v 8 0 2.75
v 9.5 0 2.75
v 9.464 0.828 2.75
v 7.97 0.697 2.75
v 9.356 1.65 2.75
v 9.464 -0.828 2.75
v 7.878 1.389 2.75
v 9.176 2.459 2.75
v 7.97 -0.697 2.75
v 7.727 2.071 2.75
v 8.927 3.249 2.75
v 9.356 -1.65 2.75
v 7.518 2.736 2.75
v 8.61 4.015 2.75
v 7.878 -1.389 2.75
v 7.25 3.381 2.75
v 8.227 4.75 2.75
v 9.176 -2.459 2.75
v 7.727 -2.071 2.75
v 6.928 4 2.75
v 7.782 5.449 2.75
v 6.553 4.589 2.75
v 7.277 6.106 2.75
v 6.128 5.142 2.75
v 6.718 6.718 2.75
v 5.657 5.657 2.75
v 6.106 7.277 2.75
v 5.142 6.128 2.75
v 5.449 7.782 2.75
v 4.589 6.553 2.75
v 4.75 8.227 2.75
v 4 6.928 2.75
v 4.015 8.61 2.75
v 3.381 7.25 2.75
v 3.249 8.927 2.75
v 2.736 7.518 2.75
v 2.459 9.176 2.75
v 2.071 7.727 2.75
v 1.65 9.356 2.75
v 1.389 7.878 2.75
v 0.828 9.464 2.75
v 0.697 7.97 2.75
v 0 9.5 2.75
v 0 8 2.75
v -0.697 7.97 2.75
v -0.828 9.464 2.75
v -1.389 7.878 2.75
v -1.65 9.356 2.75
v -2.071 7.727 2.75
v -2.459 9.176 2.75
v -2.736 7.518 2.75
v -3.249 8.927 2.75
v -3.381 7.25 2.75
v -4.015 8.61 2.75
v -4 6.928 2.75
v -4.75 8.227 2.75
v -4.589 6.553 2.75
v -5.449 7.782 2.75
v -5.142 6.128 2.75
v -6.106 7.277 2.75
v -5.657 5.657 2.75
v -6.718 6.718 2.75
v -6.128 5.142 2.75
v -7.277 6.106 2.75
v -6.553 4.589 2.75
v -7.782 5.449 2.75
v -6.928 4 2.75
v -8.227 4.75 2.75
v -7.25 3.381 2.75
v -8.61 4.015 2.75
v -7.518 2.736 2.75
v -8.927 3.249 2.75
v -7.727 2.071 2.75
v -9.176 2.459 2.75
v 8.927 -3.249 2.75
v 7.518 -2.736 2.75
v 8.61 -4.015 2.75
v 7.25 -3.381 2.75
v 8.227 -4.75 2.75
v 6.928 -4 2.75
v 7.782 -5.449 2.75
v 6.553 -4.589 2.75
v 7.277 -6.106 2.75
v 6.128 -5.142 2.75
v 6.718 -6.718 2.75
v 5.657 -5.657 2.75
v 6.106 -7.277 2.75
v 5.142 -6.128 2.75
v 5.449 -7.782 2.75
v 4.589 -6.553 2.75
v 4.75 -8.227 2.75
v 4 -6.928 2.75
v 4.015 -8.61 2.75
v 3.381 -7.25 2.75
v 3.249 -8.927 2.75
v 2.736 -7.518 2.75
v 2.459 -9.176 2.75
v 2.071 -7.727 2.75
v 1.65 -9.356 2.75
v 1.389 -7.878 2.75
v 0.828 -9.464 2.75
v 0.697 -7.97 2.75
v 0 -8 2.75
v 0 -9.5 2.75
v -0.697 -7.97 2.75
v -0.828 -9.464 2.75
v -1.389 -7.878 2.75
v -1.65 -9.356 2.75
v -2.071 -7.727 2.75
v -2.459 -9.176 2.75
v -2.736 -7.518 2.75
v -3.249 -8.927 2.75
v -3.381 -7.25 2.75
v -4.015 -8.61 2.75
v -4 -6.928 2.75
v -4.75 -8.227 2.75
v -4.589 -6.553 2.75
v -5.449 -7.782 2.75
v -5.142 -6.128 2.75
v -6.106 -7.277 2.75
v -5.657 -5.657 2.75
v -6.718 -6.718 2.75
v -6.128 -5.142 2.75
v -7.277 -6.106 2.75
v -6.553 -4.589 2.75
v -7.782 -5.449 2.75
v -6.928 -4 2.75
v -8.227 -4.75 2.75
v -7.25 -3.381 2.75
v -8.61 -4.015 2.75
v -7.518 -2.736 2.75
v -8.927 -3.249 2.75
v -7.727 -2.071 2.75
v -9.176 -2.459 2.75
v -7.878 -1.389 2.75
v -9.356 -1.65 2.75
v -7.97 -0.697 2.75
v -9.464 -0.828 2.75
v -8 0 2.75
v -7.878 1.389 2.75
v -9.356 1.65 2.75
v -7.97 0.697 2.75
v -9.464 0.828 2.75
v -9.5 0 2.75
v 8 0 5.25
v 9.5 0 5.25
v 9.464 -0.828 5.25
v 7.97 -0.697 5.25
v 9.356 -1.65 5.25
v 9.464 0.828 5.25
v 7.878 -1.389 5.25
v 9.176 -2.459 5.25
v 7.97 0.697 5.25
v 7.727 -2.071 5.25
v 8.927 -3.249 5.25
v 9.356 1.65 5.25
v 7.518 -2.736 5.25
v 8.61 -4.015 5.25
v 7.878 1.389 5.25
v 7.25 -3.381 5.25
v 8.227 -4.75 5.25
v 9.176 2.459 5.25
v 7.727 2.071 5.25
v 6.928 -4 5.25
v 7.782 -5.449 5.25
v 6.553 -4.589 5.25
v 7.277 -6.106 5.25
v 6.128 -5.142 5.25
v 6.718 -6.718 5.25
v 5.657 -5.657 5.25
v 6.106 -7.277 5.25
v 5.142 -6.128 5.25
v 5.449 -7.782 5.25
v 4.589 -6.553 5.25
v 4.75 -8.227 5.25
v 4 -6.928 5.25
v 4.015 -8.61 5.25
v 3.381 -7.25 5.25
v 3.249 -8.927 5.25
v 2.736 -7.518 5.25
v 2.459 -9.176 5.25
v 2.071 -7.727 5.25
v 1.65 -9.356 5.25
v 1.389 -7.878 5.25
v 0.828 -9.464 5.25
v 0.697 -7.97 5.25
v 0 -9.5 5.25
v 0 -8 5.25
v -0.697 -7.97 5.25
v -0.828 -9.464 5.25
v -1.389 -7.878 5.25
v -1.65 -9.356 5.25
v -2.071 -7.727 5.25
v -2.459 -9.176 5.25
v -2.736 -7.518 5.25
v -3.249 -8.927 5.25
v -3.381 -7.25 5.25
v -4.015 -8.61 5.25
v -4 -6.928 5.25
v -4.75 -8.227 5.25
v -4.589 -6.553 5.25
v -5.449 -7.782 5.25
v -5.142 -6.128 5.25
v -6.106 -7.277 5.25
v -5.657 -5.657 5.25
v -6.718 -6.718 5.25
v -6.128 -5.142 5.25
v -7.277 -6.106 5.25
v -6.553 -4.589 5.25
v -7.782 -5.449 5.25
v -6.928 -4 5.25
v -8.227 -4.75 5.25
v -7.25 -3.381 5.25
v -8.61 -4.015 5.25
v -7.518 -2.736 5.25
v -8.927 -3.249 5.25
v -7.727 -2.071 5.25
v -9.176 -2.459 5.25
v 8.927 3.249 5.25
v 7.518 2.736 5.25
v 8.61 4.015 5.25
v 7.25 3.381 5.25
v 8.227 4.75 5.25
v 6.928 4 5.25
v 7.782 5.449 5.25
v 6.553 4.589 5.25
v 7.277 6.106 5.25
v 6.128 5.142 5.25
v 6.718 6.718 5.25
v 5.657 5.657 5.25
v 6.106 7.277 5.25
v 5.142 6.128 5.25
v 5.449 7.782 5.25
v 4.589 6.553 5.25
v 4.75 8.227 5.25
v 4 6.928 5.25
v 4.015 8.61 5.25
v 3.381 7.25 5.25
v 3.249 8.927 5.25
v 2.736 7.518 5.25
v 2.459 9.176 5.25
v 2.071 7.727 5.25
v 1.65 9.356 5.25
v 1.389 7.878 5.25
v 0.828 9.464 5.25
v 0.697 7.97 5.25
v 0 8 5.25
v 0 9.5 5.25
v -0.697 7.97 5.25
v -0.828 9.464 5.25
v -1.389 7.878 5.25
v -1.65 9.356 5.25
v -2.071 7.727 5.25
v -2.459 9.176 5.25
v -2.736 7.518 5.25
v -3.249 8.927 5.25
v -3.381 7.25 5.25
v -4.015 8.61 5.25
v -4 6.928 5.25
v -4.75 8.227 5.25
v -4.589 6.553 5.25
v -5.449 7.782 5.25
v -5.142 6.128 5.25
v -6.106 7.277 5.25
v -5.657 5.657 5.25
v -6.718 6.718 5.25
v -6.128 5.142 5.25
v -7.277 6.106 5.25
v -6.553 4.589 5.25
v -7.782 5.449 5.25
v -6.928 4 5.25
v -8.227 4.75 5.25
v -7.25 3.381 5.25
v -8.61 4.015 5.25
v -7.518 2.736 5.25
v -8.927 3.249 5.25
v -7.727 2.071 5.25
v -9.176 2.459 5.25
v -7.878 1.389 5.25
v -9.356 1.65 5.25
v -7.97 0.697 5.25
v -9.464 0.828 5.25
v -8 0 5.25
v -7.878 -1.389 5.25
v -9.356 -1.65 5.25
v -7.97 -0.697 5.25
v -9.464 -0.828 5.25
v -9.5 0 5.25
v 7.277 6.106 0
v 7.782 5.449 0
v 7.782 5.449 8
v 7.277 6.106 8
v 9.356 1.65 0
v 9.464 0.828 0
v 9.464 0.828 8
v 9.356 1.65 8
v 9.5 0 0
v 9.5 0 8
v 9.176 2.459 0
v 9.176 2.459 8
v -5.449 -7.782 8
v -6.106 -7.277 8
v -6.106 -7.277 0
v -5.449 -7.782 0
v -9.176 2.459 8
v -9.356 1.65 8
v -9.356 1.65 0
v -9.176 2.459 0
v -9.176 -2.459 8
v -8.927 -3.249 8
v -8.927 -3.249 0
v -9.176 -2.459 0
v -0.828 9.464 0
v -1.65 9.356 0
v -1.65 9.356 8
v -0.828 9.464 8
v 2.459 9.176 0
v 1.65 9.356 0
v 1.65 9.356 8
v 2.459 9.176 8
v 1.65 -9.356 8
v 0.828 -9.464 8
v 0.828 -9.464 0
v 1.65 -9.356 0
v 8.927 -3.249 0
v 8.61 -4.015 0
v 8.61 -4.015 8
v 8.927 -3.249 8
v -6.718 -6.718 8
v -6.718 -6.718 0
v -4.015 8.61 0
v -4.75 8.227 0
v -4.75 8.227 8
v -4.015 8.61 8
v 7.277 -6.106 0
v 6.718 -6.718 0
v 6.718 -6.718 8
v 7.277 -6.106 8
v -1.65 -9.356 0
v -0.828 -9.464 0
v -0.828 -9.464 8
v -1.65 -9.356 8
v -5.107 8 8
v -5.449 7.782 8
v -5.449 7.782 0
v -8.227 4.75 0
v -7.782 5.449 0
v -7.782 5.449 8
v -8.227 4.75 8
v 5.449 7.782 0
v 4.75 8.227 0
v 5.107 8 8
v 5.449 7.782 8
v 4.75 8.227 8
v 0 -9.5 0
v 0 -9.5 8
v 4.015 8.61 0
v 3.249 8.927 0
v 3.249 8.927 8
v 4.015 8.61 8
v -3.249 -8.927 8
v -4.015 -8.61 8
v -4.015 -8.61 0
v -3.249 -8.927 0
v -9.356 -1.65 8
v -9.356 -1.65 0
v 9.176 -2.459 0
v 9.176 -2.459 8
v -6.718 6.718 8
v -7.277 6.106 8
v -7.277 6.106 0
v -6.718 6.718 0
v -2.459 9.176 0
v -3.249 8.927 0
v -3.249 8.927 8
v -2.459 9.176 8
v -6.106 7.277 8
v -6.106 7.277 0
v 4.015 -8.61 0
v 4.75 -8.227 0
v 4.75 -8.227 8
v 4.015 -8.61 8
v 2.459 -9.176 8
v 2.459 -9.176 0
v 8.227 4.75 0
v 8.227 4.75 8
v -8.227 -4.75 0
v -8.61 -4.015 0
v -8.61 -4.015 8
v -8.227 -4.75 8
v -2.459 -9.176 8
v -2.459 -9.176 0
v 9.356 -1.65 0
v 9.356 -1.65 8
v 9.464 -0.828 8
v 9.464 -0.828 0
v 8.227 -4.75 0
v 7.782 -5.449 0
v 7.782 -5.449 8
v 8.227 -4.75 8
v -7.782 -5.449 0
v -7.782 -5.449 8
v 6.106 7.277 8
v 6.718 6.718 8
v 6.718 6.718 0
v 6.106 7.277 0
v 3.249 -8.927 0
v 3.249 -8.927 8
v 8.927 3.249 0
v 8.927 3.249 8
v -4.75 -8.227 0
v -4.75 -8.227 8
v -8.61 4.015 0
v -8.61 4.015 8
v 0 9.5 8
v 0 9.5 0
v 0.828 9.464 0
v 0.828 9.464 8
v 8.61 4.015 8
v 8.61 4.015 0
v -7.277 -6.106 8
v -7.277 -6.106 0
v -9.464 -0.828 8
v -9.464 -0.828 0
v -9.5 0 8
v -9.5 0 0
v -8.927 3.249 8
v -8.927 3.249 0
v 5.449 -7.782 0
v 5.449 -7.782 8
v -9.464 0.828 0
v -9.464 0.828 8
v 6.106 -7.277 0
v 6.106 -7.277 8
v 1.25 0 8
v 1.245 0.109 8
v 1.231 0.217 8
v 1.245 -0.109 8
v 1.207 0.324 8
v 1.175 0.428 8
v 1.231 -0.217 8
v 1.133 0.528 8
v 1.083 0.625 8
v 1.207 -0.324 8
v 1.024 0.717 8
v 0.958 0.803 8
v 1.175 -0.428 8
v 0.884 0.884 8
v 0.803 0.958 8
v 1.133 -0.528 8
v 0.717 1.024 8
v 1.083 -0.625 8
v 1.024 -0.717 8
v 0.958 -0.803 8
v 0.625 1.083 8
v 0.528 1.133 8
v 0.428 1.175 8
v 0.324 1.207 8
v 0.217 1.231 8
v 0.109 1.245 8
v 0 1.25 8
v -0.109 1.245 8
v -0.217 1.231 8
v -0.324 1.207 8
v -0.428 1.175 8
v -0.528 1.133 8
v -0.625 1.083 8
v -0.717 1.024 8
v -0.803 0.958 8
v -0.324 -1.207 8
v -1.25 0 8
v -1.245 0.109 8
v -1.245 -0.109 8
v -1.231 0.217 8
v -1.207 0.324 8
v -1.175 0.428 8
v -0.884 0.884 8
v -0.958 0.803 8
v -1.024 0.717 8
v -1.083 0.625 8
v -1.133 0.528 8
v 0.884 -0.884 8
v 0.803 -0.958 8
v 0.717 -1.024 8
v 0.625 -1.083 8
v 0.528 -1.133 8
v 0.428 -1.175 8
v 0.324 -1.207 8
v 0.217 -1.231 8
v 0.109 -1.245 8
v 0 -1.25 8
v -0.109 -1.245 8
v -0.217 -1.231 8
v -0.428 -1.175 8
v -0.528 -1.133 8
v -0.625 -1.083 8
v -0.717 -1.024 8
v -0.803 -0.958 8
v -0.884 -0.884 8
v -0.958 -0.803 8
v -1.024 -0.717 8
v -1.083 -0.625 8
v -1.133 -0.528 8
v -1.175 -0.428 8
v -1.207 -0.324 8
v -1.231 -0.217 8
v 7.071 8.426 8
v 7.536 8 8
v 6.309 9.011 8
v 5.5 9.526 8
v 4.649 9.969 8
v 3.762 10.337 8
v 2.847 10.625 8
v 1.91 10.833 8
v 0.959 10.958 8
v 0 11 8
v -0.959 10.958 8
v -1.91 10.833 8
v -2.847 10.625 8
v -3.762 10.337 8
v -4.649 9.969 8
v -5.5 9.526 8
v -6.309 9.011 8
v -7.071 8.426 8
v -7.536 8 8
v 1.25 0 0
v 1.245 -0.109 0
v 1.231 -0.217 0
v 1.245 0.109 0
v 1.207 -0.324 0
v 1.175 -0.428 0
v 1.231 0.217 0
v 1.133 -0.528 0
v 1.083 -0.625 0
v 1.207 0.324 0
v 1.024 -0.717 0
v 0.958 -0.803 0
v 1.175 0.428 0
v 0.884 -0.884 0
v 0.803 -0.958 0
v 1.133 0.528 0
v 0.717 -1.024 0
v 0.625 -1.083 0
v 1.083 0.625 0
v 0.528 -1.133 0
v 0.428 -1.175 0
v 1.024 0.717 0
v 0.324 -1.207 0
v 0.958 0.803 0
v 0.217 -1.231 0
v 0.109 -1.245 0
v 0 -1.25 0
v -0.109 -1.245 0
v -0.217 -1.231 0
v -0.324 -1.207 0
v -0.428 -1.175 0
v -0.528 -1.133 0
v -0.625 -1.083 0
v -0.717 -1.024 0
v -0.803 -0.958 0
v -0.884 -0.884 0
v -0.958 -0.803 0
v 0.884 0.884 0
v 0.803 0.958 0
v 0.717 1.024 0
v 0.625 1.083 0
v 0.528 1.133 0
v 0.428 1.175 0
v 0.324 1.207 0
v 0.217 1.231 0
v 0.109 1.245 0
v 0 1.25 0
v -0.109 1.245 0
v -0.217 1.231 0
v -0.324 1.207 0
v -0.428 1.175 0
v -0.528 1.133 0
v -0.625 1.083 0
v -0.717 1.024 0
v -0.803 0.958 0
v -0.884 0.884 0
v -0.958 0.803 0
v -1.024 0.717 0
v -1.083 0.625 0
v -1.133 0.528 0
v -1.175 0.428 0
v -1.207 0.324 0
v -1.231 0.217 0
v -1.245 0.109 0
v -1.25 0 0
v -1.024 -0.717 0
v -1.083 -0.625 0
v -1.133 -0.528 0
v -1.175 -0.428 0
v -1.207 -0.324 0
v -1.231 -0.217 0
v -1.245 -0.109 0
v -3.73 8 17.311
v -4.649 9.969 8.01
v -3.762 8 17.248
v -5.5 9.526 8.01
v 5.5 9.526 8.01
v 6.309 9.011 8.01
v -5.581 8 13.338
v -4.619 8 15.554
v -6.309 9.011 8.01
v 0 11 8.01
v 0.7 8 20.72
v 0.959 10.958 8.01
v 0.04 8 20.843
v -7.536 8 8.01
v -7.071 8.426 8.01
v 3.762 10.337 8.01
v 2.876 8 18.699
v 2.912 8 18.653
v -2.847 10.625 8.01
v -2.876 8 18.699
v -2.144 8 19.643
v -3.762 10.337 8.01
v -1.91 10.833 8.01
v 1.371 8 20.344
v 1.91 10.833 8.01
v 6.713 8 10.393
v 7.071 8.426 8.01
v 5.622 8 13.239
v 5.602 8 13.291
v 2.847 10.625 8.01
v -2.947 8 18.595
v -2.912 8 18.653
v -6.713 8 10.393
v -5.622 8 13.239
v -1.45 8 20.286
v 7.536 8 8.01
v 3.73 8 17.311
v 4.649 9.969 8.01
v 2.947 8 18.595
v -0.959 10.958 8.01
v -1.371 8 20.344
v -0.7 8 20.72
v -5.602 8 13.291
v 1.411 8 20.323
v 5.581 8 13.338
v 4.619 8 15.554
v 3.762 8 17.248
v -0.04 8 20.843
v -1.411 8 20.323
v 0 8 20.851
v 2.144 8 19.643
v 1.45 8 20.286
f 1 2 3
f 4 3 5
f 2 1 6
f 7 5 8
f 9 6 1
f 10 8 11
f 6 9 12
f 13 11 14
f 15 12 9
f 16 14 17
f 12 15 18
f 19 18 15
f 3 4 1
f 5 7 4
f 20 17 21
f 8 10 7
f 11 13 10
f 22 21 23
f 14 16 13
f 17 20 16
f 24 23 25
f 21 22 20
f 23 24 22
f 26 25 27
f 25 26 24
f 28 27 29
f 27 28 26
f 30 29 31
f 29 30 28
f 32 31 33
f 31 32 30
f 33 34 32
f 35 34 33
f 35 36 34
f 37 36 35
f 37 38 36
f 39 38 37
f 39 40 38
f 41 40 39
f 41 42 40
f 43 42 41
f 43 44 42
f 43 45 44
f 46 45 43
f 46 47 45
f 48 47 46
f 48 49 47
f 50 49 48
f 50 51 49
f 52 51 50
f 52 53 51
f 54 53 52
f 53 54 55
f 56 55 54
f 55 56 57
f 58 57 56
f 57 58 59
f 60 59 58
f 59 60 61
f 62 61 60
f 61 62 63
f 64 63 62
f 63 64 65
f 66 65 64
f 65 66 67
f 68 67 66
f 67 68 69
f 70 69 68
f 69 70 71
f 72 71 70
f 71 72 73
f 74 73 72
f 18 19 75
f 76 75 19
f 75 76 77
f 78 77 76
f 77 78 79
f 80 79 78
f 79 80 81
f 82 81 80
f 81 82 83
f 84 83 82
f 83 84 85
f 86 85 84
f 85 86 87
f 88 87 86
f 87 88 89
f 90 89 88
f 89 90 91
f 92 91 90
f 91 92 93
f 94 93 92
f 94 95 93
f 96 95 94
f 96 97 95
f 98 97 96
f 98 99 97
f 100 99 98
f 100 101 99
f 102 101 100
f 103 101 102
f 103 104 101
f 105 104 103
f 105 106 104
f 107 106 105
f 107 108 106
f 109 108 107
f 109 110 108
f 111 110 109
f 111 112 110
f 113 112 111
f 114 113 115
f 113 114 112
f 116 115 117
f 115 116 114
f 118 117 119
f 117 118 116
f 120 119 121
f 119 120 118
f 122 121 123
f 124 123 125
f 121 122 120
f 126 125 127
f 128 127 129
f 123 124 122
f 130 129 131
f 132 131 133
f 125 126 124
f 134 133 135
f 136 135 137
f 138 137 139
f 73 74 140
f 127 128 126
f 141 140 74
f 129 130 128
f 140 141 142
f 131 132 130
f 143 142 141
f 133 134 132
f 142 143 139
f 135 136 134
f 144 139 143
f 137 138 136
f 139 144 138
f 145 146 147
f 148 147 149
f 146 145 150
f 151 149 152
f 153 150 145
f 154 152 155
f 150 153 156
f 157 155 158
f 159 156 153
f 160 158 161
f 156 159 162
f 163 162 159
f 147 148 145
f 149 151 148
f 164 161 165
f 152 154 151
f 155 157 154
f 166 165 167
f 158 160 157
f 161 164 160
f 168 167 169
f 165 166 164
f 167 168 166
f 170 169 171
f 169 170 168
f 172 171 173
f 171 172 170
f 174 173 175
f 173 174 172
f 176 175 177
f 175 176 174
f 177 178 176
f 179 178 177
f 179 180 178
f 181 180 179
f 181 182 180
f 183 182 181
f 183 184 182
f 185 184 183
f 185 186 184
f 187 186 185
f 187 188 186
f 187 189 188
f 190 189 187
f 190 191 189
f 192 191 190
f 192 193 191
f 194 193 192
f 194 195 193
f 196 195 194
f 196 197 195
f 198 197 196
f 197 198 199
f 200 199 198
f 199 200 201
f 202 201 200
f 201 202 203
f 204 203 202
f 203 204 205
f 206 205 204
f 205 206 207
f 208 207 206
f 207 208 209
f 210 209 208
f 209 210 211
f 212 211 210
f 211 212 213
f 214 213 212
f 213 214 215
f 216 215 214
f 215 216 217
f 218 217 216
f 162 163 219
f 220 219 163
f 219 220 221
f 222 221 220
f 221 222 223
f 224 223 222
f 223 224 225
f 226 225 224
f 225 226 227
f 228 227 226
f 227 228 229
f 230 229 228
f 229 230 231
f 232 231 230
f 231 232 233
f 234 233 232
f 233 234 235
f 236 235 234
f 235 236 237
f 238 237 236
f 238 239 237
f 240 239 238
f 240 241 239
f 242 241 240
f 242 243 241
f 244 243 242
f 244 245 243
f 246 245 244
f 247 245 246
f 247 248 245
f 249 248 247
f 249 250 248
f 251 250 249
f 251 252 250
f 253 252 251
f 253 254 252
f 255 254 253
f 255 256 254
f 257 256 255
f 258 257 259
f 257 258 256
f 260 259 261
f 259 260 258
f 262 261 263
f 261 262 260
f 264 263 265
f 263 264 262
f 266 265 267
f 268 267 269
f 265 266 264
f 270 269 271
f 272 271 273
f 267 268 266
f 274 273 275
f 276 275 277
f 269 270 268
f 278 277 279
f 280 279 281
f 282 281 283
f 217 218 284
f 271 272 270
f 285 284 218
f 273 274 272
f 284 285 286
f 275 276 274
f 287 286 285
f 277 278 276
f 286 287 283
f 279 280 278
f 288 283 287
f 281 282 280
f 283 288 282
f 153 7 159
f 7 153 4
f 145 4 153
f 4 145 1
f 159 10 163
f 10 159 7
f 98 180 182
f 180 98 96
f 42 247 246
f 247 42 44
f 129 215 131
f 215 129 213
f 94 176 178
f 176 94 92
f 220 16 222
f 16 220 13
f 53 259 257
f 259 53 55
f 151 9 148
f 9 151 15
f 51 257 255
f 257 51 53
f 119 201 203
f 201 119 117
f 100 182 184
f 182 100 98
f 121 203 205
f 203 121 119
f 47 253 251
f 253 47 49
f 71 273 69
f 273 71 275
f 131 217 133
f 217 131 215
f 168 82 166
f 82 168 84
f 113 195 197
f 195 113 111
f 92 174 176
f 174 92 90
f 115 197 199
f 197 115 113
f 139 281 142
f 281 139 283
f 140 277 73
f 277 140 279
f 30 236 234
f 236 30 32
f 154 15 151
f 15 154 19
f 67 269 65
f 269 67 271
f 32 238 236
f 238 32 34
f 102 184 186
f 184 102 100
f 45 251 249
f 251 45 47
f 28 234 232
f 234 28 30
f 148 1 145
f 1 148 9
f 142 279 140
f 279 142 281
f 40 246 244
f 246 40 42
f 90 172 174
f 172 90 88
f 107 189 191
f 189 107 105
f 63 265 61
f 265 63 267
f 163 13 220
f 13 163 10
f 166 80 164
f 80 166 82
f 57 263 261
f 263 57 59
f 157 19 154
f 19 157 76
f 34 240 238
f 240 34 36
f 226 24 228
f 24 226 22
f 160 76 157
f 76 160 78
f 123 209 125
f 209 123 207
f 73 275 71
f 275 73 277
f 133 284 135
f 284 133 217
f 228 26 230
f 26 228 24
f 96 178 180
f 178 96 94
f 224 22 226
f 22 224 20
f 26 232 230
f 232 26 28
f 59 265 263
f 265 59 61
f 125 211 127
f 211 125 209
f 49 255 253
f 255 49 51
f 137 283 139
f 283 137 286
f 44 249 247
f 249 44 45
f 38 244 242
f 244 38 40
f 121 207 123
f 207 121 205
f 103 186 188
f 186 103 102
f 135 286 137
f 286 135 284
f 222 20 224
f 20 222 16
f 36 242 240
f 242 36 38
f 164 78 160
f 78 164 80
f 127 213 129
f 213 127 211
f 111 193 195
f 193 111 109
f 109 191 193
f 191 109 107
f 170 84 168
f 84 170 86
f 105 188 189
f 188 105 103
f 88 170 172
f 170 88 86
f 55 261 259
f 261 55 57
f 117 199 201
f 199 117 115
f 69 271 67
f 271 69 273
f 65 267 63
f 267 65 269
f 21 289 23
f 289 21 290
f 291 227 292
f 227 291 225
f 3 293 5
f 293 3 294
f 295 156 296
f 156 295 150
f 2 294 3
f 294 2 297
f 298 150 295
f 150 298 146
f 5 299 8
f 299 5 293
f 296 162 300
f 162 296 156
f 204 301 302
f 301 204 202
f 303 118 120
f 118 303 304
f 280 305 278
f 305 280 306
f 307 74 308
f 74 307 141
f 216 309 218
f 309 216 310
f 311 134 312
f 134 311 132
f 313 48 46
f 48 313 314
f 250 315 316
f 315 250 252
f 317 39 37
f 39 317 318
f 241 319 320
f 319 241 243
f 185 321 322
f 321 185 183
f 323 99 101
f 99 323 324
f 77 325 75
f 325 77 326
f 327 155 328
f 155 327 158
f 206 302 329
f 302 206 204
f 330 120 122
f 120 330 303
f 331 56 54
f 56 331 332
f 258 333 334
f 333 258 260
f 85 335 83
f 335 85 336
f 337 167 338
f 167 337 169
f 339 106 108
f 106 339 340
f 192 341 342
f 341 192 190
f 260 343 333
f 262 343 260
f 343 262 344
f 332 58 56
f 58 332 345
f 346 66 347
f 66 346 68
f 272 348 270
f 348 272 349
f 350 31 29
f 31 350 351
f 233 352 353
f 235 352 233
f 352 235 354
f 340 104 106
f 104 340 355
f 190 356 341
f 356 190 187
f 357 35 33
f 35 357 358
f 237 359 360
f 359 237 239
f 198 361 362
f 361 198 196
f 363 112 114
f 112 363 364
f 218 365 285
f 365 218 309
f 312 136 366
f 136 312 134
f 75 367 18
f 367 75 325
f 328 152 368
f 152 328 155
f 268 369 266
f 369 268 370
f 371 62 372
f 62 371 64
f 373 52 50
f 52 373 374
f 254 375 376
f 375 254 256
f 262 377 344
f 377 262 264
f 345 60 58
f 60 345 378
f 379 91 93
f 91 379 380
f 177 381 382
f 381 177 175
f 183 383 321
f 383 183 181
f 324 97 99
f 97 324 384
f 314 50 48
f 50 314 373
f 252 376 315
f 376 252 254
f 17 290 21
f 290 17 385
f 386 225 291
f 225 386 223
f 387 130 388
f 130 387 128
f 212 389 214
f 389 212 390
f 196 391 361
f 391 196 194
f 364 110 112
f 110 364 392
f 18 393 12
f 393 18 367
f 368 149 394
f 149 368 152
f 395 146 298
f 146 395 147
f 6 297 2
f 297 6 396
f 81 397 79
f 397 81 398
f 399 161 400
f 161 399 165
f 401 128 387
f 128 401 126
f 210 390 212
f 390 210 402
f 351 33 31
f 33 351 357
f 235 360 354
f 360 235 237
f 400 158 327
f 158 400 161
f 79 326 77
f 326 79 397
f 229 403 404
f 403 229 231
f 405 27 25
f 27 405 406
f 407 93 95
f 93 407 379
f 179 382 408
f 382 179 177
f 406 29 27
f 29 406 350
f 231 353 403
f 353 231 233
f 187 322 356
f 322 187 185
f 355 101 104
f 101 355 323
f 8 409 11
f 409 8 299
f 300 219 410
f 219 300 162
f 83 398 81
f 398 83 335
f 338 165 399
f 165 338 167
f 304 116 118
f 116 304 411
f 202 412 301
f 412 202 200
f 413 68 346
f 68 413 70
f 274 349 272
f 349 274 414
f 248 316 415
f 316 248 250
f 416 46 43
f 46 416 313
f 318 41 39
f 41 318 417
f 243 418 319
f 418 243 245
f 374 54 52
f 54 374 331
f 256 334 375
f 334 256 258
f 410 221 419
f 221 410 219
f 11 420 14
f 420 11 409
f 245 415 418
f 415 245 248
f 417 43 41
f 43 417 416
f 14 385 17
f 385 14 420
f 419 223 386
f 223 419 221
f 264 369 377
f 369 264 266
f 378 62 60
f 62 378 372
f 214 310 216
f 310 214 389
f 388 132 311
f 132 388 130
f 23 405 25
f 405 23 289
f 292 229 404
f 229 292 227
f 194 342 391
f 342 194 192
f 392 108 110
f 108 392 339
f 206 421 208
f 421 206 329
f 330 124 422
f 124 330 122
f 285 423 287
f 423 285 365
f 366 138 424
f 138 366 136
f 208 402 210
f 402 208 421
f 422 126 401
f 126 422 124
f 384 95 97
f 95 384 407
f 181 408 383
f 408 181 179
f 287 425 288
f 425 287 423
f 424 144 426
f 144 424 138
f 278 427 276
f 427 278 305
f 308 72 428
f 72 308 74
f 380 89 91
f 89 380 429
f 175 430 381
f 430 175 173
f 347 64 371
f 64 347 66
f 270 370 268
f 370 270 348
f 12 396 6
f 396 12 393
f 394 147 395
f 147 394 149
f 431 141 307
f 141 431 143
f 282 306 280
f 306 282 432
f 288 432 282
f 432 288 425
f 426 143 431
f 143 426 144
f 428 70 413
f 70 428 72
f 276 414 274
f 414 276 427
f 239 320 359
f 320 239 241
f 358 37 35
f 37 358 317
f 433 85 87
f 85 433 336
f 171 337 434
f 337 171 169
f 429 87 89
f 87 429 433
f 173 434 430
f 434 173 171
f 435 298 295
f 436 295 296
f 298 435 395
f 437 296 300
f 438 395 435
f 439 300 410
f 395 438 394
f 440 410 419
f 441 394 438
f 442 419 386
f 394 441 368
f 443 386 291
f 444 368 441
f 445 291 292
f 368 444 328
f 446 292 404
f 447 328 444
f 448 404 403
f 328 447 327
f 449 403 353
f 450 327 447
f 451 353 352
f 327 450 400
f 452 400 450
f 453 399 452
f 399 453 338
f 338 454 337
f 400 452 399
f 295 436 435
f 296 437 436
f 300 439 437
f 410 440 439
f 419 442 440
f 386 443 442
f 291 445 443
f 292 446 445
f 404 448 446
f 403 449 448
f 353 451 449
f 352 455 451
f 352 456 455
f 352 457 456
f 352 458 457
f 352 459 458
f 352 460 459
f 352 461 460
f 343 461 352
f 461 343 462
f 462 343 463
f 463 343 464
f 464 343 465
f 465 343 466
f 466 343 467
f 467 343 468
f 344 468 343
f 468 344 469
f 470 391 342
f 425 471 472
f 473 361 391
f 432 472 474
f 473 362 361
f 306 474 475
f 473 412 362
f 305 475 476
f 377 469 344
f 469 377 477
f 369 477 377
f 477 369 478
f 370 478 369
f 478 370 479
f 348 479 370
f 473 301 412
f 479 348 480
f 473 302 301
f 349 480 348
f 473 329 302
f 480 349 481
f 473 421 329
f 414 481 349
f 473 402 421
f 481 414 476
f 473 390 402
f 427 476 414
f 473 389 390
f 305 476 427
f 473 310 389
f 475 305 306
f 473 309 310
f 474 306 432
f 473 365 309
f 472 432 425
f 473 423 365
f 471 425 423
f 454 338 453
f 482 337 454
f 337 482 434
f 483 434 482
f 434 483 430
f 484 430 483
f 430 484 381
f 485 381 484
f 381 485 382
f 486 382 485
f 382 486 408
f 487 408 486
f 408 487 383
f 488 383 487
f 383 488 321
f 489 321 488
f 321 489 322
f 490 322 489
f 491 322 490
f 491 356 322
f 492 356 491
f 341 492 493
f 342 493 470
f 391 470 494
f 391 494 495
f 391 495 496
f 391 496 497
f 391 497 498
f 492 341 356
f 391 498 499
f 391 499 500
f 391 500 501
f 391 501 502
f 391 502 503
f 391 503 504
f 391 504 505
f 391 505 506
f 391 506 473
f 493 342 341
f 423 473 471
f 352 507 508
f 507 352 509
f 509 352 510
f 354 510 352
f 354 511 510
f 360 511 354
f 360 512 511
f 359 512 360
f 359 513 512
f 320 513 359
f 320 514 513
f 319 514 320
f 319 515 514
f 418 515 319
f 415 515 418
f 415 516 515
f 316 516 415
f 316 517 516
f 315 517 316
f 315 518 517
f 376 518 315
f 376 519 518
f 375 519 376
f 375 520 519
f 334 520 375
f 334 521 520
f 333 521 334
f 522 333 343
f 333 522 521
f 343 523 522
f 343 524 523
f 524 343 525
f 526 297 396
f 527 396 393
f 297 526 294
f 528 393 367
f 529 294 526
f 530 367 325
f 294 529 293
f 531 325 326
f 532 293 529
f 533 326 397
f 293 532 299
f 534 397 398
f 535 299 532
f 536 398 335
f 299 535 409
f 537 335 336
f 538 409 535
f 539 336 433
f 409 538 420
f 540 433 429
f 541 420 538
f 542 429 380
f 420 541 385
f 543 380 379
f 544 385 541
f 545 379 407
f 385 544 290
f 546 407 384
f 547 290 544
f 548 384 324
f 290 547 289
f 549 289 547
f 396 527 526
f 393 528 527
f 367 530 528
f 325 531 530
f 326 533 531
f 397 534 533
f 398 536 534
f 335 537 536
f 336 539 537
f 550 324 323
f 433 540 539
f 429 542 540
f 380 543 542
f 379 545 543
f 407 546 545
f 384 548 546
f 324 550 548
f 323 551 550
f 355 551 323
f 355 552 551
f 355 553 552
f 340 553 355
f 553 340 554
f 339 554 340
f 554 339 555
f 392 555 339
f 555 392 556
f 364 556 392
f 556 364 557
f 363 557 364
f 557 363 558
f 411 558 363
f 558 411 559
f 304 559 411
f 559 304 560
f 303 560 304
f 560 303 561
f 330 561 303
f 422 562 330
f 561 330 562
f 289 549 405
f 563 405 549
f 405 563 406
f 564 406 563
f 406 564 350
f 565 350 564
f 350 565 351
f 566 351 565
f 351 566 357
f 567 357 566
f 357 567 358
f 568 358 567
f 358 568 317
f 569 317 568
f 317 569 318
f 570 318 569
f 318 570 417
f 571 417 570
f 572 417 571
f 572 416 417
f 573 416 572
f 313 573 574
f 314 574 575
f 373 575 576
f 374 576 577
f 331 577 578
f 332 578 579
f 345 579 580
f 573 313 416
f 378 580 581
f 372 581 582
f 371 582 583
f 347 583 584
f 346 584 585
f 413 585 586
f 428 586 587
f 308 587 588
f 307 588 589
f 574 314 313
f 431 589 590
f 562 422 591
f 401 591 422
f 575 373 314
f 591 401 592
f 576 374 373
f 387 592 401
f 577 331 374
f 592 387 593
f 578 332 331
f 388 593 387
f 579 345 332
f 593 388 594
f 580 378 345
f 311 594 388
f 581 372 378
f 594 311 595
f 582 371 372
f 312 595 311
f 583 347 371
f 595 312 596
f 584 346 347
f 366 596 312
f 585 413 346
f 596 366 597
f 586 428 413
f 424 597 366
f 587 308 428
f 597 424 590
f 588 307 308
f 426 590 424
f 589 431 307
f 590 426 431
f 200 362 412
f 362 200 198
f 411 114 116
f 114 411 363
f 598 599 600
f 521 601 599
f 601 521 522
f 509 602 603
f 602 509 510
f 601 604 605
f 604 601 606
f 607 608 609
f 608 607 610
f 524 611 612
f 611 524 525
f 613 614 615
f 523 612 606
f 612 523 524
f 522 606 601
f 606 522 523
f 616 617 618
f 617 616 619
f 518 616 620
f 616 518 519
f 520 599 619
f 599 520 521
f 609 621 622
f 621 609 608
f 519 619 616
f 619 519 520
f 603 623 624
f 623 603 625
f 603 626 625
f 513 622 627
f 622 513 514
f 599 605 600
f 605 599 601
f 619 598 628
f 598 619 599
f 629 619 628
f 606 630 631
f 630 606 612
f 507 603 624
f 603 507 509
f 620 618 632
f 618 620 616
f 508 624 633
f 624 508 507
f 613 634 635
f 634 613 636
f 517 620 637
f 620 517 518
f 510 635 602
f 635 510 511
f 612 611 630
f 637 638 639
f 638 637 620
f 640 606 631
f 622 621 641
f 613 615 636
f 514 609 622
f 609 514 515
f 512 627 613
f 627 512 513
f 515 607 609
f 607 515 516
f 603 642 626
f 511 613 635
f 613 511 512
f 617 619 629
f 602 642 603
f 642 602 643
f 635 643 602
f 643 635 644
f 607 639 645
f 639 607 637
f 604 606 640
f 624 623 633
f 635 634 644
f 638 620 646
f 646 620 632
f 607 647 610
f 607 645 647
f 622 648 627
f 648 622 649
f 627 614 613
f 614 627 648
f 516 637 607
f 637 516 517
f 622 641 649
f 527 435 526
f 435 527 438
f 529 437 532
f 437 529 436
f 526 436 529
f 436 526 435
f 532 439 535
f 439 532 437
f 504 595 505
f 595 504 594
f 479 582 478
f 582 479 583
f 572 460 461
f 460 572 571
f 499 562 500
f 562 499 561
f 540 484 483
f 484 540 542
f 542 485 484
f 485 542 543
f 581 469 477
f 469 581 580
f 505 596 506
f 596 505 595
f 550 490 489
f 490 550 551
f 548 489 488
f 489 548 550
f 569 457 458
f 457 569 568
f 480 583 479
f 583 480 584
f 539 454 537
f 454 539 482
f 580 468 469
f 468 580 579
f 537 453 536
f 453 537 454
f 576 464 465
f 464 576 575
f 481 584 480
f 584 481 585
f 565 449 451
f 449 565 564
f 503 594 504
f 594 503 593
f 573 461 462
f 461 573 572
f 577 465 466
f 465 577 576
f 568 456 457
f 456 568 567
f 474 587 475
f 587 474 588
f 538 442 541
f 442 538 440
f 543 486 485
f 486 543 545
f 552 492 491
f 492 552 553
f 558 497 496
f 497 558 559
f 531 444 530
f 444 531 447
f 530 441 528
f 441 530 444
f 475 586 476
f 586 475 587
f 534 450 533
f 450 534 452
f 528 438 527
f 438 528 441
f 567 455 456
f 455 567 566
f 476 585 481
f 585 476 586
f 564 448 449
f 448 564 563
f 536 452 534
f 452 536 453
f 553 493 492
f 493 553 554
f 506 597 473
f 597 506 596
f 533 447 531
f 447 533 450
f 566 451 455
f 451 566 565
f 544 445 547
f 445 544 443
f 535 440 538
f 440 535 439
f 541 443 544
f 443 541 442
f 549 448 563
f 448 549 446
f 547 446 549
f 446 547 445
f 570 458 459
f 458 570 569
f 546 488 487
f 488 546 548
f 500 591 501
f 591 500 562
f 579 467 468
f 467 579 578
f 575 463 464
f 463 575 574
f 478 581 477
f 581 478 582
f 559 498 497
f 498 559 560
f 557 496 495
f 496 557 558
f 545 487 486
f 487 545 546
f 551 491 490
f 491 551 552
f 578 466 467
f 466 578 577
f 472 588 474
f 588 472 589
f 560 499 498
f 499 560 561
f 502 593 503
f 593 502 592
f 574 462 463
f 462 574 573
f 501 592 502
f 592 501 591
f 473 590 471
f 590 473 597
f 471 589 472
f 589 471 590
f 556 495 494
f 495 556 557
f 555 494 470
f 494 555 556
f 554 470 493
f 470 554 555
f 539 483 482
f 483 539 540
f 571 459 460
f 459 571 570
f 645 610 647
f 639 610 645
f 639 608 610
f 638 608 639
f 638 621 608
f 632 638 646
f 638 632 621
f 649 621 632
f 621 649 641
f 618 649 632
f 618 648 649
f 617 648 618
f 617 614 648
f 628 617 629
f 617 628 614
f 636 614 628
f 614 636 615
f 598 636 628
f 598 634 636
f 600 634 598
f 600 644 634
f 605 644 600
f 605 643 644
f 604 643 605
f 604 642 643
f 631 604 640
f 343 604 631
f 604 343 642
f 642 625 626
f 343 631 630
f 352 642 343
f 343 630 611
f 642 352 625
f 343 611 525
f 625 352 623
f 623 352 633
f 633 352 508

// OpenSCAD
// ============================================================
//  Joe Shute Style Ballyhoo Skirt Head
//  Parametric trolling lure head – OpenSCAD
// ============================================================
//
//  A Joe Shute is a classic offshore trolling lure head used
//  to rig a ballyhoo baitfish.  Key features:
//    • Elongated bullet / tapered-cylinder body
//    • Flat (or slightly cupped) front face
//    • Center through-wire rigging hole
//    • Rear skirt collar groove that locks the skirt in place
//    • Optional chin-weight flat on the bottom
//
//  All dimensions in millimetres.
//  Print in resin or machine from aluminium / stainless steel.
// ============================================================

// ── Adjustable parameters ────────────────────────────────────

// Overall head length (nose tip to rear skirt seat)
head_length     = 50;       // mm  (~2 in)

// Maximum body diameter (at the widest point near the rear)
head_diameter   = 22;       // mm  (~7/8 in)

// Nose taper length – how far back the point runs
nose_length     = 18;       // mm

// Nose tip diameter (small but not zero to keep the shape clean)
nose_tip_dia    = 3;        // mm

// Front face cup depth (0 = flat face; >0 = concave cup)
cup_depth       = 1.5;      // mm

// Cup mouth diameter  (should be <= head_diameter)
cup_dia         = 14;       // mm

// Center through-wire hole diameter
wire_hole_dia   = 2.5;      // mm  (fits 49-strand cable or heavy mono)

// ── Skirt collar parameters ──────────────────────────────────

// Length of the cylindrical skirt seat at the rear
collar_length   = 8;        // mm

// Collar OD – slightly narrower than body so skirt slides over
collar_dia      = head_diameter - 3;  // mm

// Groove width & depth cut into the collar for the skirt ring
groove_width    = 2.5;      // mm
groove_depth    = 1.5;      // mm

// ── Chin-weight flat (optional) ─────────────────────────────
// Set chin_flat = true to add a flat on the underside of the
// taper, which biases the lure to run keel-down.
chin_flat       = true;
chin_flat_depth = 3;        // mm below centre line

// ── Render detail ────────────────────────────────────────────
$fn = 72;   // facet count – increase for smoother curves

// ============================================================
//  Modules
// ============================================================

// Body: a tapered cylinder (frustum) blending nose tip → body dia
module body() {
    hull() {
        // Rear (wide) end of the tapered body
        translate([0, 0, collar_length])
            cylinder(h = 0.01, d = head_diameter, center = false);

        // Nose tip
        translate([0, 0, head_length - nose_tip_dia / 2])
            sphere(d = nose_tip_dia);
    }
}

// Skirt collar – cylindrical seat at the rear end
module skirt_collar() {
    difference() {
        cylinder(h = collar_length, d = collar_dia, center = false);

        // Skirt-locking groove
        groove_z = collar_length * 0.5 - groove_width / 2;
        translate([0, 0, groove_z])
            difference() {
                cylinder(h = groove_width,
                         d = collar_dia + 0.02,   // full width cut
                         center = false);
                cylinder(h = groove_width,
                         d = collar_dia - groove_depth * 2,
                         center = false);
            }
    }
}

// Front face cup (concave recess on the nose face)
module face_cup() {
    if (cup_depth > 0) {
        translate([0, 0, head_length - cup_depth])
            sphere(d = cup_dia);
    }
}

// Through-wire hole – runs full length of the lure on centre
module wire_hole() {
    translate([0, 0, -1])
        cylinder(h = head_length + 2, d = wire_hole_dia, center = false);
}

// Chin flat – planar cut on the underside of the nose taper
module chin_flat_cut() {
    if (chin_flat) {
        translate([-head_diameter, -(head_diameter / 2 + chin_flat_depth),
                   collar_length])
            cube([head_diameter * 2,
                  head_diameter,
                  head_length - collar_length + 1]);
    }
}

// ============================================================
//  Assembly
// ============================================================

difference() {
    union() {
        skirt_collar();
        body();
    }
    face_cup();
    wire_hole();
    chin_flat_cut();
}
